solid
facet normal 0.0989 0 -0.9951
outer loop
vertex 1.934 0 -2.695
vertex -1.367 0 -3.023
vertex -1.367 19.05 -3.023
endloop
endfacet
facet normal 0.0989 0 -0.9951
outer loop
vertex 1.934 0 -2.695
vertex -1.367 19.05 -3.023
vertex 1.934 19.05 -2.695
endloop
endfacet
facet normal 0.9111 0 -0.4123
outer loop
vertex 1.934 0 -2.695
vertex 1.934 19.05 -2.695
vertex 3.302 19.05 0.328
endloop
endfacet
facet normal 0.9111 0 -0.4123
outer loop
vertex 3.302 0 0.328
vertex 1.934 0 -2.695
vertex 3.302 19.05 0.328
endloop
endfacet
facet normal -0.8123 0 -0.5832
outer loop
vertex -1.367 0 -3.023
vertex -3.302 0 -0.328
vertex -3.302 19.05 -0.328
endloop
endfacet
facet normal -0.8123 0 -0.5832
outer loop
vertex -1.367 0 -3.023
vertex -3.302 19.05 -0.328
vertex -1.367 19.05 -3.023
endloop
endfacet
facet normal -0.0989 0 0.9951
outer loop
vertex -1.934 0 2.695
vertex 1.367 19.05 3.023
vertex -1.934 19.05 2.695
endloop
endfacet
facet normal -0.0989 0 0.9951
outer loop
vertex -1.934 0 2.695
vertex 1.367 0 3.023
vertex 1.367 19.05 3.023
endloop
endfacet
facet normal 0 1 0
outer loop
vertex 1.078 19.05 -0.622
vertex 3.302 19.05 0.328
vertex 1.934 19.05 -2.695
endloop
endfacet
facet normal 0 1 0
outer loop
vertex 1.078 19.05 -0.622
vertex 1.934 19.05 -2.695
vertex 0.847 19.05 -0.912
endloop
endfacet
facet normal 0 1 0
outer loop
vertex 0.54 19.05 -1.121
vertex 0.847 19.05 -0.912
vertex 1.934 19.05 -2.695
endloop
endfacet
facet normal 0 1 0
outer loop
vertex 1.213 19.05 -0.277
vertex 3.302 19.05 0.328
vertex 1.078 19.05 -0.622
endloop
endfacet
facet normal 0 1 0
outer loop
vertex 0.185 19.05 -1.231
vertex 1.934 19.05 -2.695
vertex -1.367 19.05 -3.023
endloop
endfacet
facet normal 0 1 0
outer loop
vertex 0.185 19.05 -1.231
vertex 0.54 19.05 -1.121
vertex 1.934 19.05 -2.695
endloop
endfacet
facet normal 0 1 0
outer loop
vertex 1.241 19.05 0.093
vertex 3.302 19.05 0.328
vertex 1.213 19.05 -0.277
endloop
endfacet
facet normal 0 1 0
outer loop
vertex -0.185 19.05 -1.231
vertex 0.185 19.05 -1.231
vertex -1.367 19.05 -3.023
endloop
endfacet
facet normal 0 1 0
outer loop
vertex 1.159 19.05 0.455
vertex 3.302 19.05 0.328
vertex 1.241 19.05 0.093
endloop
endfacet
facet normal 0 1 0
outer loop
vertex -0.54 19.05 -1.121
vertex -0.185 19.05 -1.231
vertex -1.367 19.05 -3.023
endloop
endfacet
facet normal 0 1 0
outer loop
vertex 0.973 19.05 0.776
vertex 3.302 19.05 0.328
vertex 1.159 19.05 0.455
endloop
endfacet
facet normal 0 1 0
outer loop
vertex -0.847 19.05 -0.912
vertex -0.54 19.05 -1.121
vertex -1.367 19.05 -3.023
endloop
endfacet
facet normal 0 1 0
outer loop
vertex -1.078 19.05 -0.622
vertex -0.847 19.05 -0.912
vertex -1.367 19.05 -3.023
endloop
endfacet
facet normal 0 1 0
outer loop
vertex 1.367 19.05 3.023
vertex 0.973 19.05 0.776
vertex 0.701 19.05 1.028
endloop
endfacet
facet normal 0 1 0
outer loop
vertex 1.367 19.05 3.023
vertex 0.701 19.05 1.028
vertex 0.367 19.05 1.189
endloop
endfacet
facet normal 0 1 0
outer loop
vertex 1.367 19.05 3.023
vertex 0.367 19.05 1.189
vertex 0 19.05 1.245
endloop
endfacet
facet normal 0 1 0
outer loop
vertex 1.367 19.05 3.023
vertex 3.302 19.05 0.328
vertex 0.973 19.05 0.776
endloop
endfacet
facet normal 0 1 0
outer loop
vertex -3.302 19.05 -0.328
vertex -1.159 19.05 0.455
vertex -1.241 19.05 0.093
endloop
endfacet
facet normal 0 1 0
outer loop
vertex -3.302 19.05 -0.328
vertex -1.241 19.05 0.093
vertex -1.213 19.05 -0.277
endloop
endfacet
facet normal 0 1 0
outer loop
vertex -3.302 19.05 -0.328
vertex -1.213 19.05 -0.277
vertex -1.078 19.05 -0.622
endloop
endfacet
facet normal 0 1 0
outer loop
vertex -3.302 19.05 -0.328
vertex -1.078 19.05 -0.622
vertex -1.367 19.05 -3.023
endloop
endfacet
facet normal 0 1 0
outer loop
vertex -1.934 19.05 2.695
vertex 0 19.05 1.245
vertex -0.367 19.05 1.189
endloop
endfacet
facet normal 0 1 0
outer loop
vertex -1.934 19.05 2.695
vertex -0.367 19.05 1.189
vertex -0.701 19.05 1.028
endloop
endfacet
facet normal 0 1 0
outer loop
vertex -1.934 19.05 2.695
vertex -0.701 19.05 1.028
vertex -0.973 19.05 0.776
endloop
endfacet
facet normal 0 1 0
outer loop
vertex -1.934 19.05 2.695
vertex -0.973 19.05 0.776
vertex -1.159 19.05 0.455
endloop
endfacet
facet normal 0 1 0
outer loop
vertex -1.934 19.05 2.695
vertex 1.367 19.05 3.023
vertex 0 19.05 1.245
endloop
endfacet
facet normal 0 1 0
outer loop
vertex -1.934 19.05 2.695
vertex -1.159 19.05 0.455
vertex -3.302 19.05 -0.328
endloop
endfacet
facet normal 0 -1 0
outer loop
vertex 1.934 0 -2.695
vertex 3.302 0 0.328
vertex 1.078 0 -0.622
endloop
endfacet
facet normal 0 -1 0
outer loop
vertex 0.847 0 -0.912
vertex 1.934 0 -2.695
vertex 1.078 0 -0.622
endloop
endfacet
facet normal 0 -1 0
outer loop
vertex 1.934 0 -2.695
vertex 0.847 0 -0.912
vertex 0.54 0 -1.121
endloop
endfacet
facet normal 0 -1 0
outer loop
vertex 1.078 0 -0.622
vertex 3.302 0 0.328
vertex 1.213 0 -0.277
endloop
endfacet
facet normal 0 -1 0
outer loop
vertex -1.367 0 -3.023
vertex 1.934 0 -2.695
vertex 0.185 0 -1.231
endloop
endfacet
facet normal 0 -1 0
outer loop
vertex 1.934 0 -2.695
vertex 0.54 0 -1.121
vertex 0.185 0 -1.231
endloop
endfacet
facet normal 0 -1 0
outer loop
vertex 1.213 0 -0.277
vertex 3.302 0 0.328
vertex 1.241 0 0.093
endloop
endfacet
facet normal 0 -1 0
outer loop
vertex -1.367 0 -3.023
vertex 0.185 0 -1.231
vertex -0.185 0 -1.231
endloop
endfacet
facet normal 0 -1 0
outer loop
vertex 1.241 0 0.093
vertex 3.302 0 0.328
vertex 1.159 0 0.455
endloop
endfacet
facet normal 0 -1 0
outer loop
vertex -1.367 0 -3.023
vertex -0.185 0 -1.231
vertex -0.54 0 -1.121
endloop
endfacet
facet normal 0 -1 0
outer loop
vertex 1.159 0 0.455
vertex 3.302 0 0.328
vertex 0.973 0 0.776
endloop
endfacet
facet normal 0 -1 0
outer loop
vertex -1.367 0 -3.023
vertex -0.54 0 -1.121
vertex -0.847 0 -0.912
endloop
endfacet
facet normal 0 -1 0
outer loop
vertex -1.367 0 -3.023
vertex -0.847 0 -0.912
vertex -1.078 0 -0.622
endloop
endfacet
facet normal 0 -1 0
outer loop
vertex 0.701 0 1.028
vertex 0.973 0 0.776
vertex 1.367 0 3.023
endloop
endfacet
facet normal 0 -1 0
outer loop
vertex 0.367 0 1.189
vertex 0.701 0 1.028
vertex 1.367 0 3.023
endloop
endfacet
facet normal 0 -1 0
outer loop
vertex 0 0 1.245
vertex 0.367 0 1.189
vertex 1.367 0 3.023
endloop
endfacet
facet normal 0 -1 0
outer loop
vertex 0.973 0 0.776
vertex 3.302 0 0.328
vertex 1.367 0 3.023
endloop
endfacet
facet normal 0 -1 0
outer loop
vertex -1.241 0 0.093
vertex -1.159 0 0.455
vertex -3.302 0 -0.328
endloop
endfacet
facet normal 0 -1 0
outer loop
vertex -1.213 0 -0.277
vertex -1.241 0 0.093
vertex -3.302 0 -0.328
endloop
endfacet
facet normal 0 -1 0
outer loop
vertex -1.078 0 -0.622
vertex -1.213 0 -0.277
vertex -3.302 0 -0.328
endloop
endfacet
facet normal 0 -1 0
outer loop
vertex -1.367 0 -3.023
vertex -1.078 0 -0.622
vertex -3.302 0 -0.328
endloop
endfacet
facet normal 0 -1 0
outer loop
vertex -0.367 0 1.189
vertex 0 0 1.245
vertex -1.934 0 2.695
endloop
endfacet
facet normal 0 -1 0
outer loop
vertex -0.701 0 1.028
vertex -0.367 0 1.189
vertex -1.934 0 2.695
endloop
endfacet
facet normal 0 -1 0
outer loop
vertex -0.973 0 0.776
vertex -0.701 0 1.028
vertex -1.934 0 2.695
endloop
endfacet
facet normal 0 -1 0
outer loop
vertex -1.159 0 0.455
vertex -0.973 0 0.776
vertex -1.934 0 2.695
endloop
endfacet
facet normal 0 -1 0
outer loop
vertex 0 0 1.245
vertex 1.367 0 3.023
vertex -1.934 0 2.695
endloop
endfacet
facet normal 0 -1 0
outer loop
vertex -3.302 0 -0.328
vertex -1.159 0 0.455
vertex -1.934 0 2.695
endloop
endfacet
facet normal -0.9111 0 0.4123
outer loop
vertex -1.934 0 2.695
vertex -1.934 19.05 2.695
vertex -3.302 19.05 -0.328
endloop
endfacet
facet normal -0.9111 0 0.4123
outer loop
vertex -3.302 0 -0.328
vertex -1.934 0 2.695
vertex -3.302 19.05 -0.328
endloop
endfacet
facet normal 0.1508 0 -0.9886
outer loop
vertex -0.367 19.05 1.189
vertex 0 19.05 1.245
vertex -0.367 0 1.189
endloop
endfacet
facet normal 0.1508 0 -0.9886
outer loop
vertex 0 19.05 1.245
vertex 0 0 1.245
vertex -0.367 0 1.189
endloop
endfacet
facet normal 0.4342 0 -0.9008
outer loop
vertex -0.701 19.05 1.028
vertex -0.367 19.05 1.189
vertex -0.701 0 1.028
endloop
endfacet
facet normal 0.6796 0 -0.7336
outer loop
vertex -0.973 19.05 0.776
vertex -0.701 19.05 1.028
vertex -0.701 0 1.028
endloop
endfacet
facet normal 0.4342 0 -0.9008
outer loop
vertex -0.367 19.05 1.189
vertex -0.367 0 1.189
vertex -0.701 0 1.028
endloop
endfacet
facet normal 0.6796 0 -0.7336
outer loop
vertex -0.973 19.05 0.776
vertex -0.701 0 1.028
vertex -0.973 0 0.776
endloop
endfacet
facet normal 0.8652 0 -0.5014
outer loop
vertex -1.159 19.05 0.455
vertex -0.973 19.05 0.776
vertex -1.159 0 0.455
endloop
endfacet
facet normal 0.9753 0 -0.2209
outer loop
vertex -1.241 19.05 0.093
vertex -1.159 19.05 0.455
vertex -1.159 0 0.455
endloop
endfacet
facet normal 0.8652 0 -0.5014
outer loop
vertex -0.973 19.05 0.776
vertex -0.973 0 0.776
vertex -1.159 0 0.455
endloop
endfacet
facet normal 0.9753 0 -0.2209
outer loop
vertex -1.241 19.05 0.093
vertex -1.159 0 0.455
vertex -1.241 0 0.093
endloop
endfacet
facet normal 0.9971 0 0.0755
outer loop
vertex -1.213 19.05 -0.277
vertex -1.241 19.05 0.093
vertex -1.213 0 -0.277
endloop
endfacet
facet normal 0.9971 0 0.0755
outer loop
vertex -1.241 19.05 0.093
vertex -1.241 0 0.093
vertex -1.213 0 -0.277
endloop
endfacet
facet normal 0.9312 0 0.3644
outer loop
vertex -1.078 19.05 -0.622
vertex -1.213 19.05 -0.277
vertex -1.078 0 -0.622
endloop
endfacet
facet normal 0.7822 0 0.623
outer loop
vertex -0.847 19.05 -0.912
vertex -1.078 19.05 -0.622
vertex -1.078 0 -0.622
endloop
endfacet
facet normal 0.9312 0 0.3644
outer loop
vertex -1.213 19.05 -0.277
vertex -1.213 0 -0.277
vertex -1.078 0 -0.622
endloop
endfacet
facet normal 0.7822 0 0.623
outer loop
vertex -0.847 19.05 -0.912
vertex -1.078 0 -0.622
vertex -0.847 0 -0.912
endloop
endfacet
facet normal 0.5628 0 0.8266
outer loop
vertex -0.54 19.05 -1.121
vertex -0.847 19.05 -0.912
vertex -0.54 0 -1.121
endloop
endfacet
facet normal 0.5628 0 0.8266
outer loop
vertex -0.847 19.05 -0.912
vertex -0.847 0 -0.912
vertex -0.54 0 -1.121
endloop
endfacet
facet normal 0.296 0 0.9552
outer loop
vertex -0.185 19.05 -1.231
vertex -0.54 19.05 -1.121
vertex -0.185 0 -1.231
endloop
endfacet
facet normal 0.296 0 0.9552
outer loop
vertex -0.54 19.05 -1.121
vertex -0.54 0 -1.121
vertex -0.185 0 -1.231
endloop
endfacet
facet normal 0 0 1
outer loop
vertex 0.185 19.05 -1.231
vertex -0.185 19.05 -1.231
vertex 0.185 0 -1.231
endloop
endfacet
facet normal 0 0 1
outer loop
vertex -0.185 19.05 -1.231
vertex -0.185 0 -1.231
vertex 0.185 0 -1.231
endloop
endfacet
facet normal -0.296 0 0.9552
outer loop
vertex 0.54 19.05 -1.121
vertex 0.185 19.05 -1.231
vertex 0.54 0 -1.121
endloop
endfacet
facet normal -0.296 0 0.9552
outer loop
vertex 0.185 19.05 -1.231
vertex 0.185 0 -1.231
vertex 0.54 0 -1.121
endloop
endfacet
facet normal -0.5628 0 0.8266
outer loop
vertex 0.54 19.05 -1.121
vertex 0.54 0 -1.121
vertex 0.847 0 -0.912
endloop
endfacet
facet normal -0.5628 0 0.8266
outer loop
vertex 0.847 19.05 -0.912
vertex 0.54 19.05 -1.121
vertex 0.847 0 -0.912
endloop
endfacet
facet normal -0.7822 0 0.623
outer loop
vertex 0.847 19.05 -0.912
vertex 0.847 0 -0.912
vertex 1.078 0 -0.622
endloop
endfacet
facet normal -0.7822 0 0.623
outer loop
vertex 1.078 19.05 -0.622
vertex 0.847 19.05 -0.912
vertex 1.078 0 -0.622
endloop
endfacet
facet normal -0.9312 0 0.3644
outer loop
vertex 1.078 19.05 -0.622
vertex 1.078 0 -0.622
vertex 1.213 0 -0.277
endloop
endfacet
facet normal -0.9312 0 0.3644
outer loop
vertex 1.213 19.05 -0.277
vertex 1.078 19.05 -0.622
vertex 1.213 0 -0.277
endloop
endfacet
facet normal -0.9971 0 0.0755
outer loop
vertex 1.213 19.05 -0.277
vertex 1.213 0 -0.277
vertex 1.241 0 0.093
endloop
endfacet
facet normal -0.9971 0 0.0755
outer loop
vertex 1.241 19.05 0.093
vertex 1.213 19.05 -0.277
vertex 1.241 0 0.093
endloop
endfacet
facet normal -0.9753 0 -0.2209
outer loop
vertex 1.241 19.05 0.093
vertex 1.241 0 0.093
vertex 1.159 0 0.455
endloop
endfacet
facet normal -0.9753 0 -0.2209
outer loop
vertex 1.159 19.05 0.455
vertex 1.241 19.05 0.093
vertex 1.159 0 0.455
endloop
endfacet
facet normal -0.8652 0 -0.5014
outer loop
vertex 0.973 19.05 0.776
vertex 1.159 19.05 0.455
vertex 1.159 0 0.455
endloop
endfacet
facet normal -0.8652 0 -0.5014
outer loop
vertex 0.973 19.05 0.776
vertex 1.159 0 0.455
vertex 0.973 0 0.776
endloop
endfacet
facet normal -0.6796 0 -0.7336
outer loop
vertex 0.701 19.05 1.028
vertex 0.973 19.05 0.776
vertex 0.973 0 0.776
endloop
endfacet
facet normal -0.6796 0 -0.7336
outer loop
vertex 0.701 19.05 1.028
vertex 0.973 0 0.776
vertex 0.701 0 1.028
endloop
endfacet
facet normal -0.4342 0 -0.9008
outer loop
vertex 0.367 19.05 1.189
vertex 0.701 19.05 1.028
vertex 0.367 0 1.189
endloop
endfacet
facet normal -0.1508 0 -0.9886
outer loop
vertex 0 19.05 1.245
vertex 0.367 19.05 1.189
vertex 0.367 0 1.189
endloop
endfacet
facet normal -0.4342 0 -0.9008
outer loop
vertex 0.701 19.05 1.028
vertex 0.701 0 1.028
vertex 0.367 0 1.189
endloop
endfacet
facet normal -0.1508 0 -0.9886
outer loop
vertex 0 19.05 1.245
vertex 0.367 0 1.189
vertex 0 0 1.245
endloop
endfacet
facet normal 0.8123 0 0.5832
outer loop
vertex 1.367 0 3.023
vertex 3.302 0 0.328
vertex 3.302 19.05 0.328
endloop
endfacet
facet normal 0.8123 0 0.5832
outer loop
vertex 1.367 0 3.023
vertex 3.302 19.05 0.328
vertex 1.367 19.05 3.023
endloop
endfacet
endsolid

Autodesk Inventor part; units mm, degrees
ref_plane "YZ Plane" through (0, 0, 0) normal (1, 0, 0) x (0, 1, 0)
ref_plane "XZ Plane" through (0, 0, 0) normal (0, 1, 0) x (-1, 0, 0)
ref_plane "XY Plane" through (0, 0, 0) normal (0, 0, 1) x (1, 0, 0)
sketch "Sketch1" plane through (0, 0, 0) normal (0, 1, 0) x (-1, 0, 0)
  line L0 (1.9345, 2.6954) -> (3.3015, -0.3277)
  line L1 (3.3015, -0.3277) -> (1.367, -3.0231)
  line L2 (1.367, -3.0231) -> (-1.9345, -2.6954)
  line L3 (-1.9345, -2.6954) -> (-3.3015, 0.3277)
  line L4 (-3.3015, 0.3277) -> (-1.367, 3.0231)
  line L5 (-1.367, 3.0231) -> (1.9345, 2.6954)
  point P0 (0, 0)
  point P1 (0, 0)
extrude "Extrusion1" add sketch "Sketch1" along normal blind 19.05
sketch "Sketch2" plane through (0, 19.05, 0) normal (0, 1, 0) x (1, 0, 0)
  point P0 (0, 0)
  point P1 (0, 0)
hole "Hole1" at (0, 19.05, 0) direction (0, -1, 0) diameter 2.4892 end through all
properties part number "standoff"
